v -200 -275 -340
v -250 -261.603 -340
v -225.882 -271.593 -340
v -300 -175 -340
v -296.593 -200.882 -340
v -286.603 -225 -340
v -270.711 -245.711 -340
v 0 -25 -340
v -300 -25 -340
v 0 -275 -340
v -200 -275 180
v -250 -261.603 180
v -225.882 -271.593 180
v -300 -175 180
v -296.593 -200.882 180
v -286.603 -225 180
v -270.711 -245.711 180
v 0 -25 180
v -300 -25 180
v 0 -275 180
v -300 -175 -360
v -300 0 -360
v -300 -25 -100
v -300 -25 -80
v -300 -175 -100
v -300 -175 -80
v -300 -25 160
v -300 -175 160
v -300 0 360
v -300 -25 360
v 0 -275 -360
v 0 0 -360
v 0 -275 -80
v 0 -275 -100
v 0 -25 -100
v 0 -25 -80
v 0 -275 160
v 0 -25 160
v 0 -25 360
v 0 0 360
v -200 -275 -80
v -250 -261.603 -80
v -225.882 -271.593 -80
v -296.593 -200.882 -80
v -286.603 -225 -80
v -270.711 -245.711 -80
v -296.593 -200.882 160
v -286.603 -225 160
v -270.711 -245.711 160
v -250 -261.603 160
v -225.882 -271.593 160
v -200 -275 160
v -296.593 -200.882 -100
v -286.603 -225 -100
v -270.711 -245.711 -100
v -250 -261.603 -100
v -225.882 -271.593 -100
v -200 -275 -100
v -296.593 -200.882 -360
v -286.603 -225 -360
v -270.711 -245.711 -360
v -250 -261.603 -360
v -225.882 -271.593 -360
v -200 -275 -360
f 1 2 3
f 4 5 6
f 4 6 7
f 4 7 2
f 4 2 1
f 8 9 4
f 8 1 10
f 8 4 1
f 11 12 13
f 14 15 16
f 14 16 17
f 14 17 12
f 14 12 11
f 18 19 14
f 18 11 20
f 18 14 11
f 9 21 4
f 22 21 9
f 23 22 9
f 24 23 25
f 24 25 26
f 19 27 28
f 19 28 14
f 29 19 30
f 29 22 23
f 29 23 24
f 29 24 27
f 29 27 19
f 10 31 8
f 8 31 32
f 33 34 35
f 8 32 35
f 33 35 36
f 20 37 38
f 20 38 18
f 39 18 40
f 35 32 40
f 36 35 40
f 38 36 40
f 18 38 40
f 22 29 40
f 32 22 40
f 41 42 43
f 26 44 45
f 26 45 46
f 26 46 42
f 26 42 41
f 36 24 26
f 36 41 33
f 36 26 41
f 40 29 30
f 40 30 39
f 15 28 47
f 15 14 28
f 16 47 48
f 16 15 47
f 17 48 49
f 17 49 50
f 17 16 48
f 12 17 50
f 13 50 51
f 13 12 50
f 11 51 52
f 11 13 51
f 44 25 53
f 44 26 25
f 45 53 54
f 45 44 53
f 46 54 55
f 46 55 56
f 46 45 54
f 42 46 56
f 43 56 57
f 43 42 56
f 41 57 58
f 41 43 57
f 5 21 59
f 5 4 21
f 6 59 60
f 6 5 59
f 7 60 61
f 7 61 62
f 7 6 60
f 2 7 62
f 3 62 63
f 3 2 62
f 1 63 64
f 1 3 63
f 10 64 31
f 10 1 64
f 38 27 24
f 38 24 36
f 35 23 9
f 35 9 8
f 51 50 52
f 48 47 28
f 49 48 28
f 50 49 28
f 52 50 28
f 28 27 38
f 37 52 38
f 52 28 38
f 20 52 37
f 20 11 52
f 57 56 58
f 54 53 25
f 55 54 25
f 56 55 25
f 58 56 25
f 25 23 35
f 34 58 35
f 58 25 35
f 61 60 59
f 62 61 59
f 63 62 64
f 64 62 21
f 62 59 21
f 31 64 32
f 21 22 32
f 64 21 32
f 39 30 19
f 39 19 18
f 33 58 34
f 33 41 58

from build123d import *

# Parameters (mm, degrees)
F0_W     = 300
F0_H     = 720
F1_DEPTH = 25
F2_W     = 300
F2_H     = 20
F3_DEPTH = 250
F4_R     = 100
F5_W     = 300
F5_H     = 20
F6_DEPTH = 250
F7_R     = 100


with BuildPart() as f1:
    # F0 (on Front) → F1 (new body)
    with BuildSketch(Plane.XZ):
        with Locations((-150, 0)):
            Rectangle(F0_W, F0_H)
    extrude(amount=F1_DEPTH)

    # F2 (on face) → F3 (join)
    with BuildSketch(Plane.XZ.offset(25)):
        with Locations((-150, -350)):
            Rectangle(F2_W, F2_H)
    extrude(amount=F3_DEPTH)

    # F4
    f4_edges = [f1.edges().sort_by_distance(p)[0] for p in [
        (-300, -275, -350),
    ]]
    fillet(f4_edges, radius=F4_R)

    # F5 (on face) → F6 (join)
    with BuildSketch(Plane.XZ.offset(25)):
        with Locations((-150, -90)):
            Rectangle(F5_W, F5_H)
        with Locations((-150, 170)):
            Rectangle(F5_W, F5_H)
    extrude(amount=F6_DEPTH)

    # F7
    f7_edges = [f1.edges().sort_by_distance(p)[0] for p in [
        (-300, -275, 170),
        (-300, -275, -90),
    ]]
    fillet(f7_edges, radius=F7_R)


solid = f1.part
